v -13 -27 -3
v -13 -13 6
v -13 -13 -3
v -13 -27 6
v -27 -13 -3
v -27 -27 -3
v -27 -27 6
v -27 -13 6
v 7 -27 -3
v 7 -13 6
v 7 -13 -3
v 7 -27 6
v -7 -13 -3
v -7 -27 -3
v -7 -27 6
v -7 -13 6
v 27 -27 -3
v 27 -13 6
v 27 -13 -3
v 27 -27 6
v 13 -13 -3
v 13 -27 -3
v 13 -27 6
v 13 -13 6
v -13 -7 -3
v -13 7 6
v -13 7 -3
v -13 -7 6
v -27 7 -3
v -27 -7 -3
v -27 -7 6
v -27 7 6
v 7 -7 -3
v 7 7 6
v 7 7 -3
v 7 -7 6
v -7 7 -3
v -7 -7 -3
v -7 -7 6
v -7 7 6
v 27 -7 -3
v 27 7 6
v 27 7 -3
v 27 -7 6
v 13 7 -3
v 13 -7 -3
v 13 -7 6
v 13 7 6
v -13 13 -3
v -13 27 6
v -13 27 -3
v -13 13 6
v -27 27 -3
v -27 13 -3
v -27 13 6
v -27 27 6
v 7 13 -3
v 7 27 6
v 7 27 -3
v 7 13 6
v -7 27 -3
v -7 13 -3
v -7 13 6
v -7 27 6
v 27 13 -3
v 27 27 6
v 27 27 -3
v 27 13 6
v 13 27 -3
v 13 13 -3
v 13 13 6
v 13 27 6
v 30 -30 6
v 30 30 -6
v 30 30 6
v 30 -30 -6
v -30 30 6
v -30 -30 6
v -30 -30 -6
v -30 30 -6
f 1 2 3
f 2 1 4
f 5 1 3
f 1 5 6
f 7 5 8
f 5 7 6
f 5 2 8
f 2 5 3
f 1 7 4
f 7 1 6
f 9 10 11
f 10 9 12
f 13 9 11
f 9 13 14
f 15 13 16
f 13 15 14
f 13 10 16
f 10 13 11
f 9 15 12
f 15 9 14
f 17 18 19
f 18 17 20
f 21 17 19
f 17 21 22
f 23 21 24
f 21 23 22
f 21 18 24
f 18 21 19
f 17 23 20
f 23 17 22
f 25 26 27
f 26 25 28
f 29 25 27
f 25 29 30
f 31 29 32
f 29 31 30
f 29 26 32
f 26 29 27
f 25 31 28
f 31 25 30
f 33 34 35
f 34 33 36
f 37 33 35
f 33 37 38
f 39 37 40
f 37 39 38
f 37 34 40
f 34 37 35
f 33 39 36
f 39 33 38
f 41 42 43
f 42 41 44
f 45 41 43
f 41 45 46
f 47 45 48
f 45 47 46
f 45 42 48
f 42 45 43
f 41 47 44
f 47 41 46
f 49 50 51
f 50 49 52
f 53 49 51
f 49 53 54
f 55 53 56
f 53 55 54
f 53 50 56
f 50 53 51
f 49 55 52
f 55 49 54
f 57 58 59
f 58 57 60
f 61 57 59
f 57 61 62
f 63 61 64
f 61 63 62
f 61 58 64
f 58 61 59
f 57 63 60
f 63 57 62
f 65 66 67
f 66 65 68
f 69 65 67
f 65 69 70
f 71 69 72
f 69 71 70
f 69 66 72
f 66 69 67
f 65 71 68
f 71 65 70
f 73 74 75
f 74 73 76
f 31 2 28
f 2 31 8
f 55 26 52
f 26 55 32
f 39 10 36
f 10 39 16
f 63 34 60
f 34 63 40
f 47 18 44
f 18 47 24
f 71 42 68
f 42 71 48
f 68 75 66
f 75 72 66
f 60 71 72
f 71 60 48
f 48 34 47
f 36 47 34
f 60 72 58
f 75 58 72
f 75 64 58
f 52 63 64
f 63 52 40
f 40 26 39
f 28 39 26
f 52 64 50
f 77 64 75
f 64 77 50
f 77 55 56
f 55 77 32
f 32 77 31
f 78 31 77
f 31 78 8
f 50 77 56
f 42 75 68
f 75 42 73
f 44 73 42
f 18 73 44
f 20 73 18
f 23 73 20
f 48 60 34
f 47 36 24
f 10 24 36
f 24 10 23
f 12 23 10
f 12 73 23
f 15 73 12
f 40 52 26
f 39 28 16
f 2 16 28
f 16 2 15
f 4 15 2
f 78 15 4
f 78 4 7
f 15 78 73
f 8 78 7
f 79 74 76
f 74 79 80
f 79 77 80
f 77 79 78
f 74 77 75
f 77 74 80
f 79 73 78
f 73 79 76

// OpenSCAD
$fn = 32;

// ----------------------------------------------------------------------
// Pocket plate 60 x 60 x 12
// 3 x 3 pockets 14 mm square, 9 mm deep
// ----------------------------------------------------------------------

// --- parameters (mm) ---
thickness = 12;  // plate thickness
floor_t = 3;     // material left under each pocket
pocket = 14;     // pocket side length
pitch_x = 20;    // pocket pitch along X
pitch_y = 20;    // pocket pitch along Y
cols = 3;        // pockets per row
rows = 3;        // rows of pockets

// --- derived feature positions (mm) ---
depth = thickness - floor_t;        // = 9   pocket depth, down to the floor
span_x = (cols - 1) * pitch_x;      // = 40   distance between outer pockets
span_y = (rows - 1) * pitch_y;      // = 40   distance between outer pocket rows
origin_x = -span_x / 2;             // = -20   X of the first pocket
origin_y = -span_y / 2;             // = -20   Y of the first pocket
plate = [span_x + pocket + 6, span_y + pocket + 6, thickness];  // = [60, 60, 12]   overall size: pockets plus 3 mm of wall on each side
feature_centers = [
  [origin_x + 0 * pitch_x, origin_y + 0 * pitch_y],
  [origin_x + 1 * pitch_x, origin_y + 0 * pitch_y],
  [origin_x + 2 * pitch_x, origin_y + 0 * pitch_y],
  [origin_x + 0 * pitch_x, origin_y + 1 * pitch_y],
  [origin_x + 1 * pitch_x, origin_y + 1 * pitch_y],
  [origin_x + 2 * pitch_x, origin_y + 1 * pitch_y],
  [origin_x + 0 * pitch_x, origin_y + 2 * pitch_y],
  [origin_x + 1 * pitch_x, origin_y + 2 * pitch_y],
  [origin_x + 2 * pitch_x, origin_y + 2 * pitch_y]
];   // pocket centres, used verbatim by the cutter loop

// plate outline, then one pocket per centre in feature_centers
difference() {
  cube(plate, center = true);
  for (centre = feature_centers)
    translate([centre[0] - pocket / 2, centre[1] - pocket / 2, plate[2] / 2 - depth])
      cube([pocket, pocket, depth + 1]);  // centred on the declared pocket centre
}
